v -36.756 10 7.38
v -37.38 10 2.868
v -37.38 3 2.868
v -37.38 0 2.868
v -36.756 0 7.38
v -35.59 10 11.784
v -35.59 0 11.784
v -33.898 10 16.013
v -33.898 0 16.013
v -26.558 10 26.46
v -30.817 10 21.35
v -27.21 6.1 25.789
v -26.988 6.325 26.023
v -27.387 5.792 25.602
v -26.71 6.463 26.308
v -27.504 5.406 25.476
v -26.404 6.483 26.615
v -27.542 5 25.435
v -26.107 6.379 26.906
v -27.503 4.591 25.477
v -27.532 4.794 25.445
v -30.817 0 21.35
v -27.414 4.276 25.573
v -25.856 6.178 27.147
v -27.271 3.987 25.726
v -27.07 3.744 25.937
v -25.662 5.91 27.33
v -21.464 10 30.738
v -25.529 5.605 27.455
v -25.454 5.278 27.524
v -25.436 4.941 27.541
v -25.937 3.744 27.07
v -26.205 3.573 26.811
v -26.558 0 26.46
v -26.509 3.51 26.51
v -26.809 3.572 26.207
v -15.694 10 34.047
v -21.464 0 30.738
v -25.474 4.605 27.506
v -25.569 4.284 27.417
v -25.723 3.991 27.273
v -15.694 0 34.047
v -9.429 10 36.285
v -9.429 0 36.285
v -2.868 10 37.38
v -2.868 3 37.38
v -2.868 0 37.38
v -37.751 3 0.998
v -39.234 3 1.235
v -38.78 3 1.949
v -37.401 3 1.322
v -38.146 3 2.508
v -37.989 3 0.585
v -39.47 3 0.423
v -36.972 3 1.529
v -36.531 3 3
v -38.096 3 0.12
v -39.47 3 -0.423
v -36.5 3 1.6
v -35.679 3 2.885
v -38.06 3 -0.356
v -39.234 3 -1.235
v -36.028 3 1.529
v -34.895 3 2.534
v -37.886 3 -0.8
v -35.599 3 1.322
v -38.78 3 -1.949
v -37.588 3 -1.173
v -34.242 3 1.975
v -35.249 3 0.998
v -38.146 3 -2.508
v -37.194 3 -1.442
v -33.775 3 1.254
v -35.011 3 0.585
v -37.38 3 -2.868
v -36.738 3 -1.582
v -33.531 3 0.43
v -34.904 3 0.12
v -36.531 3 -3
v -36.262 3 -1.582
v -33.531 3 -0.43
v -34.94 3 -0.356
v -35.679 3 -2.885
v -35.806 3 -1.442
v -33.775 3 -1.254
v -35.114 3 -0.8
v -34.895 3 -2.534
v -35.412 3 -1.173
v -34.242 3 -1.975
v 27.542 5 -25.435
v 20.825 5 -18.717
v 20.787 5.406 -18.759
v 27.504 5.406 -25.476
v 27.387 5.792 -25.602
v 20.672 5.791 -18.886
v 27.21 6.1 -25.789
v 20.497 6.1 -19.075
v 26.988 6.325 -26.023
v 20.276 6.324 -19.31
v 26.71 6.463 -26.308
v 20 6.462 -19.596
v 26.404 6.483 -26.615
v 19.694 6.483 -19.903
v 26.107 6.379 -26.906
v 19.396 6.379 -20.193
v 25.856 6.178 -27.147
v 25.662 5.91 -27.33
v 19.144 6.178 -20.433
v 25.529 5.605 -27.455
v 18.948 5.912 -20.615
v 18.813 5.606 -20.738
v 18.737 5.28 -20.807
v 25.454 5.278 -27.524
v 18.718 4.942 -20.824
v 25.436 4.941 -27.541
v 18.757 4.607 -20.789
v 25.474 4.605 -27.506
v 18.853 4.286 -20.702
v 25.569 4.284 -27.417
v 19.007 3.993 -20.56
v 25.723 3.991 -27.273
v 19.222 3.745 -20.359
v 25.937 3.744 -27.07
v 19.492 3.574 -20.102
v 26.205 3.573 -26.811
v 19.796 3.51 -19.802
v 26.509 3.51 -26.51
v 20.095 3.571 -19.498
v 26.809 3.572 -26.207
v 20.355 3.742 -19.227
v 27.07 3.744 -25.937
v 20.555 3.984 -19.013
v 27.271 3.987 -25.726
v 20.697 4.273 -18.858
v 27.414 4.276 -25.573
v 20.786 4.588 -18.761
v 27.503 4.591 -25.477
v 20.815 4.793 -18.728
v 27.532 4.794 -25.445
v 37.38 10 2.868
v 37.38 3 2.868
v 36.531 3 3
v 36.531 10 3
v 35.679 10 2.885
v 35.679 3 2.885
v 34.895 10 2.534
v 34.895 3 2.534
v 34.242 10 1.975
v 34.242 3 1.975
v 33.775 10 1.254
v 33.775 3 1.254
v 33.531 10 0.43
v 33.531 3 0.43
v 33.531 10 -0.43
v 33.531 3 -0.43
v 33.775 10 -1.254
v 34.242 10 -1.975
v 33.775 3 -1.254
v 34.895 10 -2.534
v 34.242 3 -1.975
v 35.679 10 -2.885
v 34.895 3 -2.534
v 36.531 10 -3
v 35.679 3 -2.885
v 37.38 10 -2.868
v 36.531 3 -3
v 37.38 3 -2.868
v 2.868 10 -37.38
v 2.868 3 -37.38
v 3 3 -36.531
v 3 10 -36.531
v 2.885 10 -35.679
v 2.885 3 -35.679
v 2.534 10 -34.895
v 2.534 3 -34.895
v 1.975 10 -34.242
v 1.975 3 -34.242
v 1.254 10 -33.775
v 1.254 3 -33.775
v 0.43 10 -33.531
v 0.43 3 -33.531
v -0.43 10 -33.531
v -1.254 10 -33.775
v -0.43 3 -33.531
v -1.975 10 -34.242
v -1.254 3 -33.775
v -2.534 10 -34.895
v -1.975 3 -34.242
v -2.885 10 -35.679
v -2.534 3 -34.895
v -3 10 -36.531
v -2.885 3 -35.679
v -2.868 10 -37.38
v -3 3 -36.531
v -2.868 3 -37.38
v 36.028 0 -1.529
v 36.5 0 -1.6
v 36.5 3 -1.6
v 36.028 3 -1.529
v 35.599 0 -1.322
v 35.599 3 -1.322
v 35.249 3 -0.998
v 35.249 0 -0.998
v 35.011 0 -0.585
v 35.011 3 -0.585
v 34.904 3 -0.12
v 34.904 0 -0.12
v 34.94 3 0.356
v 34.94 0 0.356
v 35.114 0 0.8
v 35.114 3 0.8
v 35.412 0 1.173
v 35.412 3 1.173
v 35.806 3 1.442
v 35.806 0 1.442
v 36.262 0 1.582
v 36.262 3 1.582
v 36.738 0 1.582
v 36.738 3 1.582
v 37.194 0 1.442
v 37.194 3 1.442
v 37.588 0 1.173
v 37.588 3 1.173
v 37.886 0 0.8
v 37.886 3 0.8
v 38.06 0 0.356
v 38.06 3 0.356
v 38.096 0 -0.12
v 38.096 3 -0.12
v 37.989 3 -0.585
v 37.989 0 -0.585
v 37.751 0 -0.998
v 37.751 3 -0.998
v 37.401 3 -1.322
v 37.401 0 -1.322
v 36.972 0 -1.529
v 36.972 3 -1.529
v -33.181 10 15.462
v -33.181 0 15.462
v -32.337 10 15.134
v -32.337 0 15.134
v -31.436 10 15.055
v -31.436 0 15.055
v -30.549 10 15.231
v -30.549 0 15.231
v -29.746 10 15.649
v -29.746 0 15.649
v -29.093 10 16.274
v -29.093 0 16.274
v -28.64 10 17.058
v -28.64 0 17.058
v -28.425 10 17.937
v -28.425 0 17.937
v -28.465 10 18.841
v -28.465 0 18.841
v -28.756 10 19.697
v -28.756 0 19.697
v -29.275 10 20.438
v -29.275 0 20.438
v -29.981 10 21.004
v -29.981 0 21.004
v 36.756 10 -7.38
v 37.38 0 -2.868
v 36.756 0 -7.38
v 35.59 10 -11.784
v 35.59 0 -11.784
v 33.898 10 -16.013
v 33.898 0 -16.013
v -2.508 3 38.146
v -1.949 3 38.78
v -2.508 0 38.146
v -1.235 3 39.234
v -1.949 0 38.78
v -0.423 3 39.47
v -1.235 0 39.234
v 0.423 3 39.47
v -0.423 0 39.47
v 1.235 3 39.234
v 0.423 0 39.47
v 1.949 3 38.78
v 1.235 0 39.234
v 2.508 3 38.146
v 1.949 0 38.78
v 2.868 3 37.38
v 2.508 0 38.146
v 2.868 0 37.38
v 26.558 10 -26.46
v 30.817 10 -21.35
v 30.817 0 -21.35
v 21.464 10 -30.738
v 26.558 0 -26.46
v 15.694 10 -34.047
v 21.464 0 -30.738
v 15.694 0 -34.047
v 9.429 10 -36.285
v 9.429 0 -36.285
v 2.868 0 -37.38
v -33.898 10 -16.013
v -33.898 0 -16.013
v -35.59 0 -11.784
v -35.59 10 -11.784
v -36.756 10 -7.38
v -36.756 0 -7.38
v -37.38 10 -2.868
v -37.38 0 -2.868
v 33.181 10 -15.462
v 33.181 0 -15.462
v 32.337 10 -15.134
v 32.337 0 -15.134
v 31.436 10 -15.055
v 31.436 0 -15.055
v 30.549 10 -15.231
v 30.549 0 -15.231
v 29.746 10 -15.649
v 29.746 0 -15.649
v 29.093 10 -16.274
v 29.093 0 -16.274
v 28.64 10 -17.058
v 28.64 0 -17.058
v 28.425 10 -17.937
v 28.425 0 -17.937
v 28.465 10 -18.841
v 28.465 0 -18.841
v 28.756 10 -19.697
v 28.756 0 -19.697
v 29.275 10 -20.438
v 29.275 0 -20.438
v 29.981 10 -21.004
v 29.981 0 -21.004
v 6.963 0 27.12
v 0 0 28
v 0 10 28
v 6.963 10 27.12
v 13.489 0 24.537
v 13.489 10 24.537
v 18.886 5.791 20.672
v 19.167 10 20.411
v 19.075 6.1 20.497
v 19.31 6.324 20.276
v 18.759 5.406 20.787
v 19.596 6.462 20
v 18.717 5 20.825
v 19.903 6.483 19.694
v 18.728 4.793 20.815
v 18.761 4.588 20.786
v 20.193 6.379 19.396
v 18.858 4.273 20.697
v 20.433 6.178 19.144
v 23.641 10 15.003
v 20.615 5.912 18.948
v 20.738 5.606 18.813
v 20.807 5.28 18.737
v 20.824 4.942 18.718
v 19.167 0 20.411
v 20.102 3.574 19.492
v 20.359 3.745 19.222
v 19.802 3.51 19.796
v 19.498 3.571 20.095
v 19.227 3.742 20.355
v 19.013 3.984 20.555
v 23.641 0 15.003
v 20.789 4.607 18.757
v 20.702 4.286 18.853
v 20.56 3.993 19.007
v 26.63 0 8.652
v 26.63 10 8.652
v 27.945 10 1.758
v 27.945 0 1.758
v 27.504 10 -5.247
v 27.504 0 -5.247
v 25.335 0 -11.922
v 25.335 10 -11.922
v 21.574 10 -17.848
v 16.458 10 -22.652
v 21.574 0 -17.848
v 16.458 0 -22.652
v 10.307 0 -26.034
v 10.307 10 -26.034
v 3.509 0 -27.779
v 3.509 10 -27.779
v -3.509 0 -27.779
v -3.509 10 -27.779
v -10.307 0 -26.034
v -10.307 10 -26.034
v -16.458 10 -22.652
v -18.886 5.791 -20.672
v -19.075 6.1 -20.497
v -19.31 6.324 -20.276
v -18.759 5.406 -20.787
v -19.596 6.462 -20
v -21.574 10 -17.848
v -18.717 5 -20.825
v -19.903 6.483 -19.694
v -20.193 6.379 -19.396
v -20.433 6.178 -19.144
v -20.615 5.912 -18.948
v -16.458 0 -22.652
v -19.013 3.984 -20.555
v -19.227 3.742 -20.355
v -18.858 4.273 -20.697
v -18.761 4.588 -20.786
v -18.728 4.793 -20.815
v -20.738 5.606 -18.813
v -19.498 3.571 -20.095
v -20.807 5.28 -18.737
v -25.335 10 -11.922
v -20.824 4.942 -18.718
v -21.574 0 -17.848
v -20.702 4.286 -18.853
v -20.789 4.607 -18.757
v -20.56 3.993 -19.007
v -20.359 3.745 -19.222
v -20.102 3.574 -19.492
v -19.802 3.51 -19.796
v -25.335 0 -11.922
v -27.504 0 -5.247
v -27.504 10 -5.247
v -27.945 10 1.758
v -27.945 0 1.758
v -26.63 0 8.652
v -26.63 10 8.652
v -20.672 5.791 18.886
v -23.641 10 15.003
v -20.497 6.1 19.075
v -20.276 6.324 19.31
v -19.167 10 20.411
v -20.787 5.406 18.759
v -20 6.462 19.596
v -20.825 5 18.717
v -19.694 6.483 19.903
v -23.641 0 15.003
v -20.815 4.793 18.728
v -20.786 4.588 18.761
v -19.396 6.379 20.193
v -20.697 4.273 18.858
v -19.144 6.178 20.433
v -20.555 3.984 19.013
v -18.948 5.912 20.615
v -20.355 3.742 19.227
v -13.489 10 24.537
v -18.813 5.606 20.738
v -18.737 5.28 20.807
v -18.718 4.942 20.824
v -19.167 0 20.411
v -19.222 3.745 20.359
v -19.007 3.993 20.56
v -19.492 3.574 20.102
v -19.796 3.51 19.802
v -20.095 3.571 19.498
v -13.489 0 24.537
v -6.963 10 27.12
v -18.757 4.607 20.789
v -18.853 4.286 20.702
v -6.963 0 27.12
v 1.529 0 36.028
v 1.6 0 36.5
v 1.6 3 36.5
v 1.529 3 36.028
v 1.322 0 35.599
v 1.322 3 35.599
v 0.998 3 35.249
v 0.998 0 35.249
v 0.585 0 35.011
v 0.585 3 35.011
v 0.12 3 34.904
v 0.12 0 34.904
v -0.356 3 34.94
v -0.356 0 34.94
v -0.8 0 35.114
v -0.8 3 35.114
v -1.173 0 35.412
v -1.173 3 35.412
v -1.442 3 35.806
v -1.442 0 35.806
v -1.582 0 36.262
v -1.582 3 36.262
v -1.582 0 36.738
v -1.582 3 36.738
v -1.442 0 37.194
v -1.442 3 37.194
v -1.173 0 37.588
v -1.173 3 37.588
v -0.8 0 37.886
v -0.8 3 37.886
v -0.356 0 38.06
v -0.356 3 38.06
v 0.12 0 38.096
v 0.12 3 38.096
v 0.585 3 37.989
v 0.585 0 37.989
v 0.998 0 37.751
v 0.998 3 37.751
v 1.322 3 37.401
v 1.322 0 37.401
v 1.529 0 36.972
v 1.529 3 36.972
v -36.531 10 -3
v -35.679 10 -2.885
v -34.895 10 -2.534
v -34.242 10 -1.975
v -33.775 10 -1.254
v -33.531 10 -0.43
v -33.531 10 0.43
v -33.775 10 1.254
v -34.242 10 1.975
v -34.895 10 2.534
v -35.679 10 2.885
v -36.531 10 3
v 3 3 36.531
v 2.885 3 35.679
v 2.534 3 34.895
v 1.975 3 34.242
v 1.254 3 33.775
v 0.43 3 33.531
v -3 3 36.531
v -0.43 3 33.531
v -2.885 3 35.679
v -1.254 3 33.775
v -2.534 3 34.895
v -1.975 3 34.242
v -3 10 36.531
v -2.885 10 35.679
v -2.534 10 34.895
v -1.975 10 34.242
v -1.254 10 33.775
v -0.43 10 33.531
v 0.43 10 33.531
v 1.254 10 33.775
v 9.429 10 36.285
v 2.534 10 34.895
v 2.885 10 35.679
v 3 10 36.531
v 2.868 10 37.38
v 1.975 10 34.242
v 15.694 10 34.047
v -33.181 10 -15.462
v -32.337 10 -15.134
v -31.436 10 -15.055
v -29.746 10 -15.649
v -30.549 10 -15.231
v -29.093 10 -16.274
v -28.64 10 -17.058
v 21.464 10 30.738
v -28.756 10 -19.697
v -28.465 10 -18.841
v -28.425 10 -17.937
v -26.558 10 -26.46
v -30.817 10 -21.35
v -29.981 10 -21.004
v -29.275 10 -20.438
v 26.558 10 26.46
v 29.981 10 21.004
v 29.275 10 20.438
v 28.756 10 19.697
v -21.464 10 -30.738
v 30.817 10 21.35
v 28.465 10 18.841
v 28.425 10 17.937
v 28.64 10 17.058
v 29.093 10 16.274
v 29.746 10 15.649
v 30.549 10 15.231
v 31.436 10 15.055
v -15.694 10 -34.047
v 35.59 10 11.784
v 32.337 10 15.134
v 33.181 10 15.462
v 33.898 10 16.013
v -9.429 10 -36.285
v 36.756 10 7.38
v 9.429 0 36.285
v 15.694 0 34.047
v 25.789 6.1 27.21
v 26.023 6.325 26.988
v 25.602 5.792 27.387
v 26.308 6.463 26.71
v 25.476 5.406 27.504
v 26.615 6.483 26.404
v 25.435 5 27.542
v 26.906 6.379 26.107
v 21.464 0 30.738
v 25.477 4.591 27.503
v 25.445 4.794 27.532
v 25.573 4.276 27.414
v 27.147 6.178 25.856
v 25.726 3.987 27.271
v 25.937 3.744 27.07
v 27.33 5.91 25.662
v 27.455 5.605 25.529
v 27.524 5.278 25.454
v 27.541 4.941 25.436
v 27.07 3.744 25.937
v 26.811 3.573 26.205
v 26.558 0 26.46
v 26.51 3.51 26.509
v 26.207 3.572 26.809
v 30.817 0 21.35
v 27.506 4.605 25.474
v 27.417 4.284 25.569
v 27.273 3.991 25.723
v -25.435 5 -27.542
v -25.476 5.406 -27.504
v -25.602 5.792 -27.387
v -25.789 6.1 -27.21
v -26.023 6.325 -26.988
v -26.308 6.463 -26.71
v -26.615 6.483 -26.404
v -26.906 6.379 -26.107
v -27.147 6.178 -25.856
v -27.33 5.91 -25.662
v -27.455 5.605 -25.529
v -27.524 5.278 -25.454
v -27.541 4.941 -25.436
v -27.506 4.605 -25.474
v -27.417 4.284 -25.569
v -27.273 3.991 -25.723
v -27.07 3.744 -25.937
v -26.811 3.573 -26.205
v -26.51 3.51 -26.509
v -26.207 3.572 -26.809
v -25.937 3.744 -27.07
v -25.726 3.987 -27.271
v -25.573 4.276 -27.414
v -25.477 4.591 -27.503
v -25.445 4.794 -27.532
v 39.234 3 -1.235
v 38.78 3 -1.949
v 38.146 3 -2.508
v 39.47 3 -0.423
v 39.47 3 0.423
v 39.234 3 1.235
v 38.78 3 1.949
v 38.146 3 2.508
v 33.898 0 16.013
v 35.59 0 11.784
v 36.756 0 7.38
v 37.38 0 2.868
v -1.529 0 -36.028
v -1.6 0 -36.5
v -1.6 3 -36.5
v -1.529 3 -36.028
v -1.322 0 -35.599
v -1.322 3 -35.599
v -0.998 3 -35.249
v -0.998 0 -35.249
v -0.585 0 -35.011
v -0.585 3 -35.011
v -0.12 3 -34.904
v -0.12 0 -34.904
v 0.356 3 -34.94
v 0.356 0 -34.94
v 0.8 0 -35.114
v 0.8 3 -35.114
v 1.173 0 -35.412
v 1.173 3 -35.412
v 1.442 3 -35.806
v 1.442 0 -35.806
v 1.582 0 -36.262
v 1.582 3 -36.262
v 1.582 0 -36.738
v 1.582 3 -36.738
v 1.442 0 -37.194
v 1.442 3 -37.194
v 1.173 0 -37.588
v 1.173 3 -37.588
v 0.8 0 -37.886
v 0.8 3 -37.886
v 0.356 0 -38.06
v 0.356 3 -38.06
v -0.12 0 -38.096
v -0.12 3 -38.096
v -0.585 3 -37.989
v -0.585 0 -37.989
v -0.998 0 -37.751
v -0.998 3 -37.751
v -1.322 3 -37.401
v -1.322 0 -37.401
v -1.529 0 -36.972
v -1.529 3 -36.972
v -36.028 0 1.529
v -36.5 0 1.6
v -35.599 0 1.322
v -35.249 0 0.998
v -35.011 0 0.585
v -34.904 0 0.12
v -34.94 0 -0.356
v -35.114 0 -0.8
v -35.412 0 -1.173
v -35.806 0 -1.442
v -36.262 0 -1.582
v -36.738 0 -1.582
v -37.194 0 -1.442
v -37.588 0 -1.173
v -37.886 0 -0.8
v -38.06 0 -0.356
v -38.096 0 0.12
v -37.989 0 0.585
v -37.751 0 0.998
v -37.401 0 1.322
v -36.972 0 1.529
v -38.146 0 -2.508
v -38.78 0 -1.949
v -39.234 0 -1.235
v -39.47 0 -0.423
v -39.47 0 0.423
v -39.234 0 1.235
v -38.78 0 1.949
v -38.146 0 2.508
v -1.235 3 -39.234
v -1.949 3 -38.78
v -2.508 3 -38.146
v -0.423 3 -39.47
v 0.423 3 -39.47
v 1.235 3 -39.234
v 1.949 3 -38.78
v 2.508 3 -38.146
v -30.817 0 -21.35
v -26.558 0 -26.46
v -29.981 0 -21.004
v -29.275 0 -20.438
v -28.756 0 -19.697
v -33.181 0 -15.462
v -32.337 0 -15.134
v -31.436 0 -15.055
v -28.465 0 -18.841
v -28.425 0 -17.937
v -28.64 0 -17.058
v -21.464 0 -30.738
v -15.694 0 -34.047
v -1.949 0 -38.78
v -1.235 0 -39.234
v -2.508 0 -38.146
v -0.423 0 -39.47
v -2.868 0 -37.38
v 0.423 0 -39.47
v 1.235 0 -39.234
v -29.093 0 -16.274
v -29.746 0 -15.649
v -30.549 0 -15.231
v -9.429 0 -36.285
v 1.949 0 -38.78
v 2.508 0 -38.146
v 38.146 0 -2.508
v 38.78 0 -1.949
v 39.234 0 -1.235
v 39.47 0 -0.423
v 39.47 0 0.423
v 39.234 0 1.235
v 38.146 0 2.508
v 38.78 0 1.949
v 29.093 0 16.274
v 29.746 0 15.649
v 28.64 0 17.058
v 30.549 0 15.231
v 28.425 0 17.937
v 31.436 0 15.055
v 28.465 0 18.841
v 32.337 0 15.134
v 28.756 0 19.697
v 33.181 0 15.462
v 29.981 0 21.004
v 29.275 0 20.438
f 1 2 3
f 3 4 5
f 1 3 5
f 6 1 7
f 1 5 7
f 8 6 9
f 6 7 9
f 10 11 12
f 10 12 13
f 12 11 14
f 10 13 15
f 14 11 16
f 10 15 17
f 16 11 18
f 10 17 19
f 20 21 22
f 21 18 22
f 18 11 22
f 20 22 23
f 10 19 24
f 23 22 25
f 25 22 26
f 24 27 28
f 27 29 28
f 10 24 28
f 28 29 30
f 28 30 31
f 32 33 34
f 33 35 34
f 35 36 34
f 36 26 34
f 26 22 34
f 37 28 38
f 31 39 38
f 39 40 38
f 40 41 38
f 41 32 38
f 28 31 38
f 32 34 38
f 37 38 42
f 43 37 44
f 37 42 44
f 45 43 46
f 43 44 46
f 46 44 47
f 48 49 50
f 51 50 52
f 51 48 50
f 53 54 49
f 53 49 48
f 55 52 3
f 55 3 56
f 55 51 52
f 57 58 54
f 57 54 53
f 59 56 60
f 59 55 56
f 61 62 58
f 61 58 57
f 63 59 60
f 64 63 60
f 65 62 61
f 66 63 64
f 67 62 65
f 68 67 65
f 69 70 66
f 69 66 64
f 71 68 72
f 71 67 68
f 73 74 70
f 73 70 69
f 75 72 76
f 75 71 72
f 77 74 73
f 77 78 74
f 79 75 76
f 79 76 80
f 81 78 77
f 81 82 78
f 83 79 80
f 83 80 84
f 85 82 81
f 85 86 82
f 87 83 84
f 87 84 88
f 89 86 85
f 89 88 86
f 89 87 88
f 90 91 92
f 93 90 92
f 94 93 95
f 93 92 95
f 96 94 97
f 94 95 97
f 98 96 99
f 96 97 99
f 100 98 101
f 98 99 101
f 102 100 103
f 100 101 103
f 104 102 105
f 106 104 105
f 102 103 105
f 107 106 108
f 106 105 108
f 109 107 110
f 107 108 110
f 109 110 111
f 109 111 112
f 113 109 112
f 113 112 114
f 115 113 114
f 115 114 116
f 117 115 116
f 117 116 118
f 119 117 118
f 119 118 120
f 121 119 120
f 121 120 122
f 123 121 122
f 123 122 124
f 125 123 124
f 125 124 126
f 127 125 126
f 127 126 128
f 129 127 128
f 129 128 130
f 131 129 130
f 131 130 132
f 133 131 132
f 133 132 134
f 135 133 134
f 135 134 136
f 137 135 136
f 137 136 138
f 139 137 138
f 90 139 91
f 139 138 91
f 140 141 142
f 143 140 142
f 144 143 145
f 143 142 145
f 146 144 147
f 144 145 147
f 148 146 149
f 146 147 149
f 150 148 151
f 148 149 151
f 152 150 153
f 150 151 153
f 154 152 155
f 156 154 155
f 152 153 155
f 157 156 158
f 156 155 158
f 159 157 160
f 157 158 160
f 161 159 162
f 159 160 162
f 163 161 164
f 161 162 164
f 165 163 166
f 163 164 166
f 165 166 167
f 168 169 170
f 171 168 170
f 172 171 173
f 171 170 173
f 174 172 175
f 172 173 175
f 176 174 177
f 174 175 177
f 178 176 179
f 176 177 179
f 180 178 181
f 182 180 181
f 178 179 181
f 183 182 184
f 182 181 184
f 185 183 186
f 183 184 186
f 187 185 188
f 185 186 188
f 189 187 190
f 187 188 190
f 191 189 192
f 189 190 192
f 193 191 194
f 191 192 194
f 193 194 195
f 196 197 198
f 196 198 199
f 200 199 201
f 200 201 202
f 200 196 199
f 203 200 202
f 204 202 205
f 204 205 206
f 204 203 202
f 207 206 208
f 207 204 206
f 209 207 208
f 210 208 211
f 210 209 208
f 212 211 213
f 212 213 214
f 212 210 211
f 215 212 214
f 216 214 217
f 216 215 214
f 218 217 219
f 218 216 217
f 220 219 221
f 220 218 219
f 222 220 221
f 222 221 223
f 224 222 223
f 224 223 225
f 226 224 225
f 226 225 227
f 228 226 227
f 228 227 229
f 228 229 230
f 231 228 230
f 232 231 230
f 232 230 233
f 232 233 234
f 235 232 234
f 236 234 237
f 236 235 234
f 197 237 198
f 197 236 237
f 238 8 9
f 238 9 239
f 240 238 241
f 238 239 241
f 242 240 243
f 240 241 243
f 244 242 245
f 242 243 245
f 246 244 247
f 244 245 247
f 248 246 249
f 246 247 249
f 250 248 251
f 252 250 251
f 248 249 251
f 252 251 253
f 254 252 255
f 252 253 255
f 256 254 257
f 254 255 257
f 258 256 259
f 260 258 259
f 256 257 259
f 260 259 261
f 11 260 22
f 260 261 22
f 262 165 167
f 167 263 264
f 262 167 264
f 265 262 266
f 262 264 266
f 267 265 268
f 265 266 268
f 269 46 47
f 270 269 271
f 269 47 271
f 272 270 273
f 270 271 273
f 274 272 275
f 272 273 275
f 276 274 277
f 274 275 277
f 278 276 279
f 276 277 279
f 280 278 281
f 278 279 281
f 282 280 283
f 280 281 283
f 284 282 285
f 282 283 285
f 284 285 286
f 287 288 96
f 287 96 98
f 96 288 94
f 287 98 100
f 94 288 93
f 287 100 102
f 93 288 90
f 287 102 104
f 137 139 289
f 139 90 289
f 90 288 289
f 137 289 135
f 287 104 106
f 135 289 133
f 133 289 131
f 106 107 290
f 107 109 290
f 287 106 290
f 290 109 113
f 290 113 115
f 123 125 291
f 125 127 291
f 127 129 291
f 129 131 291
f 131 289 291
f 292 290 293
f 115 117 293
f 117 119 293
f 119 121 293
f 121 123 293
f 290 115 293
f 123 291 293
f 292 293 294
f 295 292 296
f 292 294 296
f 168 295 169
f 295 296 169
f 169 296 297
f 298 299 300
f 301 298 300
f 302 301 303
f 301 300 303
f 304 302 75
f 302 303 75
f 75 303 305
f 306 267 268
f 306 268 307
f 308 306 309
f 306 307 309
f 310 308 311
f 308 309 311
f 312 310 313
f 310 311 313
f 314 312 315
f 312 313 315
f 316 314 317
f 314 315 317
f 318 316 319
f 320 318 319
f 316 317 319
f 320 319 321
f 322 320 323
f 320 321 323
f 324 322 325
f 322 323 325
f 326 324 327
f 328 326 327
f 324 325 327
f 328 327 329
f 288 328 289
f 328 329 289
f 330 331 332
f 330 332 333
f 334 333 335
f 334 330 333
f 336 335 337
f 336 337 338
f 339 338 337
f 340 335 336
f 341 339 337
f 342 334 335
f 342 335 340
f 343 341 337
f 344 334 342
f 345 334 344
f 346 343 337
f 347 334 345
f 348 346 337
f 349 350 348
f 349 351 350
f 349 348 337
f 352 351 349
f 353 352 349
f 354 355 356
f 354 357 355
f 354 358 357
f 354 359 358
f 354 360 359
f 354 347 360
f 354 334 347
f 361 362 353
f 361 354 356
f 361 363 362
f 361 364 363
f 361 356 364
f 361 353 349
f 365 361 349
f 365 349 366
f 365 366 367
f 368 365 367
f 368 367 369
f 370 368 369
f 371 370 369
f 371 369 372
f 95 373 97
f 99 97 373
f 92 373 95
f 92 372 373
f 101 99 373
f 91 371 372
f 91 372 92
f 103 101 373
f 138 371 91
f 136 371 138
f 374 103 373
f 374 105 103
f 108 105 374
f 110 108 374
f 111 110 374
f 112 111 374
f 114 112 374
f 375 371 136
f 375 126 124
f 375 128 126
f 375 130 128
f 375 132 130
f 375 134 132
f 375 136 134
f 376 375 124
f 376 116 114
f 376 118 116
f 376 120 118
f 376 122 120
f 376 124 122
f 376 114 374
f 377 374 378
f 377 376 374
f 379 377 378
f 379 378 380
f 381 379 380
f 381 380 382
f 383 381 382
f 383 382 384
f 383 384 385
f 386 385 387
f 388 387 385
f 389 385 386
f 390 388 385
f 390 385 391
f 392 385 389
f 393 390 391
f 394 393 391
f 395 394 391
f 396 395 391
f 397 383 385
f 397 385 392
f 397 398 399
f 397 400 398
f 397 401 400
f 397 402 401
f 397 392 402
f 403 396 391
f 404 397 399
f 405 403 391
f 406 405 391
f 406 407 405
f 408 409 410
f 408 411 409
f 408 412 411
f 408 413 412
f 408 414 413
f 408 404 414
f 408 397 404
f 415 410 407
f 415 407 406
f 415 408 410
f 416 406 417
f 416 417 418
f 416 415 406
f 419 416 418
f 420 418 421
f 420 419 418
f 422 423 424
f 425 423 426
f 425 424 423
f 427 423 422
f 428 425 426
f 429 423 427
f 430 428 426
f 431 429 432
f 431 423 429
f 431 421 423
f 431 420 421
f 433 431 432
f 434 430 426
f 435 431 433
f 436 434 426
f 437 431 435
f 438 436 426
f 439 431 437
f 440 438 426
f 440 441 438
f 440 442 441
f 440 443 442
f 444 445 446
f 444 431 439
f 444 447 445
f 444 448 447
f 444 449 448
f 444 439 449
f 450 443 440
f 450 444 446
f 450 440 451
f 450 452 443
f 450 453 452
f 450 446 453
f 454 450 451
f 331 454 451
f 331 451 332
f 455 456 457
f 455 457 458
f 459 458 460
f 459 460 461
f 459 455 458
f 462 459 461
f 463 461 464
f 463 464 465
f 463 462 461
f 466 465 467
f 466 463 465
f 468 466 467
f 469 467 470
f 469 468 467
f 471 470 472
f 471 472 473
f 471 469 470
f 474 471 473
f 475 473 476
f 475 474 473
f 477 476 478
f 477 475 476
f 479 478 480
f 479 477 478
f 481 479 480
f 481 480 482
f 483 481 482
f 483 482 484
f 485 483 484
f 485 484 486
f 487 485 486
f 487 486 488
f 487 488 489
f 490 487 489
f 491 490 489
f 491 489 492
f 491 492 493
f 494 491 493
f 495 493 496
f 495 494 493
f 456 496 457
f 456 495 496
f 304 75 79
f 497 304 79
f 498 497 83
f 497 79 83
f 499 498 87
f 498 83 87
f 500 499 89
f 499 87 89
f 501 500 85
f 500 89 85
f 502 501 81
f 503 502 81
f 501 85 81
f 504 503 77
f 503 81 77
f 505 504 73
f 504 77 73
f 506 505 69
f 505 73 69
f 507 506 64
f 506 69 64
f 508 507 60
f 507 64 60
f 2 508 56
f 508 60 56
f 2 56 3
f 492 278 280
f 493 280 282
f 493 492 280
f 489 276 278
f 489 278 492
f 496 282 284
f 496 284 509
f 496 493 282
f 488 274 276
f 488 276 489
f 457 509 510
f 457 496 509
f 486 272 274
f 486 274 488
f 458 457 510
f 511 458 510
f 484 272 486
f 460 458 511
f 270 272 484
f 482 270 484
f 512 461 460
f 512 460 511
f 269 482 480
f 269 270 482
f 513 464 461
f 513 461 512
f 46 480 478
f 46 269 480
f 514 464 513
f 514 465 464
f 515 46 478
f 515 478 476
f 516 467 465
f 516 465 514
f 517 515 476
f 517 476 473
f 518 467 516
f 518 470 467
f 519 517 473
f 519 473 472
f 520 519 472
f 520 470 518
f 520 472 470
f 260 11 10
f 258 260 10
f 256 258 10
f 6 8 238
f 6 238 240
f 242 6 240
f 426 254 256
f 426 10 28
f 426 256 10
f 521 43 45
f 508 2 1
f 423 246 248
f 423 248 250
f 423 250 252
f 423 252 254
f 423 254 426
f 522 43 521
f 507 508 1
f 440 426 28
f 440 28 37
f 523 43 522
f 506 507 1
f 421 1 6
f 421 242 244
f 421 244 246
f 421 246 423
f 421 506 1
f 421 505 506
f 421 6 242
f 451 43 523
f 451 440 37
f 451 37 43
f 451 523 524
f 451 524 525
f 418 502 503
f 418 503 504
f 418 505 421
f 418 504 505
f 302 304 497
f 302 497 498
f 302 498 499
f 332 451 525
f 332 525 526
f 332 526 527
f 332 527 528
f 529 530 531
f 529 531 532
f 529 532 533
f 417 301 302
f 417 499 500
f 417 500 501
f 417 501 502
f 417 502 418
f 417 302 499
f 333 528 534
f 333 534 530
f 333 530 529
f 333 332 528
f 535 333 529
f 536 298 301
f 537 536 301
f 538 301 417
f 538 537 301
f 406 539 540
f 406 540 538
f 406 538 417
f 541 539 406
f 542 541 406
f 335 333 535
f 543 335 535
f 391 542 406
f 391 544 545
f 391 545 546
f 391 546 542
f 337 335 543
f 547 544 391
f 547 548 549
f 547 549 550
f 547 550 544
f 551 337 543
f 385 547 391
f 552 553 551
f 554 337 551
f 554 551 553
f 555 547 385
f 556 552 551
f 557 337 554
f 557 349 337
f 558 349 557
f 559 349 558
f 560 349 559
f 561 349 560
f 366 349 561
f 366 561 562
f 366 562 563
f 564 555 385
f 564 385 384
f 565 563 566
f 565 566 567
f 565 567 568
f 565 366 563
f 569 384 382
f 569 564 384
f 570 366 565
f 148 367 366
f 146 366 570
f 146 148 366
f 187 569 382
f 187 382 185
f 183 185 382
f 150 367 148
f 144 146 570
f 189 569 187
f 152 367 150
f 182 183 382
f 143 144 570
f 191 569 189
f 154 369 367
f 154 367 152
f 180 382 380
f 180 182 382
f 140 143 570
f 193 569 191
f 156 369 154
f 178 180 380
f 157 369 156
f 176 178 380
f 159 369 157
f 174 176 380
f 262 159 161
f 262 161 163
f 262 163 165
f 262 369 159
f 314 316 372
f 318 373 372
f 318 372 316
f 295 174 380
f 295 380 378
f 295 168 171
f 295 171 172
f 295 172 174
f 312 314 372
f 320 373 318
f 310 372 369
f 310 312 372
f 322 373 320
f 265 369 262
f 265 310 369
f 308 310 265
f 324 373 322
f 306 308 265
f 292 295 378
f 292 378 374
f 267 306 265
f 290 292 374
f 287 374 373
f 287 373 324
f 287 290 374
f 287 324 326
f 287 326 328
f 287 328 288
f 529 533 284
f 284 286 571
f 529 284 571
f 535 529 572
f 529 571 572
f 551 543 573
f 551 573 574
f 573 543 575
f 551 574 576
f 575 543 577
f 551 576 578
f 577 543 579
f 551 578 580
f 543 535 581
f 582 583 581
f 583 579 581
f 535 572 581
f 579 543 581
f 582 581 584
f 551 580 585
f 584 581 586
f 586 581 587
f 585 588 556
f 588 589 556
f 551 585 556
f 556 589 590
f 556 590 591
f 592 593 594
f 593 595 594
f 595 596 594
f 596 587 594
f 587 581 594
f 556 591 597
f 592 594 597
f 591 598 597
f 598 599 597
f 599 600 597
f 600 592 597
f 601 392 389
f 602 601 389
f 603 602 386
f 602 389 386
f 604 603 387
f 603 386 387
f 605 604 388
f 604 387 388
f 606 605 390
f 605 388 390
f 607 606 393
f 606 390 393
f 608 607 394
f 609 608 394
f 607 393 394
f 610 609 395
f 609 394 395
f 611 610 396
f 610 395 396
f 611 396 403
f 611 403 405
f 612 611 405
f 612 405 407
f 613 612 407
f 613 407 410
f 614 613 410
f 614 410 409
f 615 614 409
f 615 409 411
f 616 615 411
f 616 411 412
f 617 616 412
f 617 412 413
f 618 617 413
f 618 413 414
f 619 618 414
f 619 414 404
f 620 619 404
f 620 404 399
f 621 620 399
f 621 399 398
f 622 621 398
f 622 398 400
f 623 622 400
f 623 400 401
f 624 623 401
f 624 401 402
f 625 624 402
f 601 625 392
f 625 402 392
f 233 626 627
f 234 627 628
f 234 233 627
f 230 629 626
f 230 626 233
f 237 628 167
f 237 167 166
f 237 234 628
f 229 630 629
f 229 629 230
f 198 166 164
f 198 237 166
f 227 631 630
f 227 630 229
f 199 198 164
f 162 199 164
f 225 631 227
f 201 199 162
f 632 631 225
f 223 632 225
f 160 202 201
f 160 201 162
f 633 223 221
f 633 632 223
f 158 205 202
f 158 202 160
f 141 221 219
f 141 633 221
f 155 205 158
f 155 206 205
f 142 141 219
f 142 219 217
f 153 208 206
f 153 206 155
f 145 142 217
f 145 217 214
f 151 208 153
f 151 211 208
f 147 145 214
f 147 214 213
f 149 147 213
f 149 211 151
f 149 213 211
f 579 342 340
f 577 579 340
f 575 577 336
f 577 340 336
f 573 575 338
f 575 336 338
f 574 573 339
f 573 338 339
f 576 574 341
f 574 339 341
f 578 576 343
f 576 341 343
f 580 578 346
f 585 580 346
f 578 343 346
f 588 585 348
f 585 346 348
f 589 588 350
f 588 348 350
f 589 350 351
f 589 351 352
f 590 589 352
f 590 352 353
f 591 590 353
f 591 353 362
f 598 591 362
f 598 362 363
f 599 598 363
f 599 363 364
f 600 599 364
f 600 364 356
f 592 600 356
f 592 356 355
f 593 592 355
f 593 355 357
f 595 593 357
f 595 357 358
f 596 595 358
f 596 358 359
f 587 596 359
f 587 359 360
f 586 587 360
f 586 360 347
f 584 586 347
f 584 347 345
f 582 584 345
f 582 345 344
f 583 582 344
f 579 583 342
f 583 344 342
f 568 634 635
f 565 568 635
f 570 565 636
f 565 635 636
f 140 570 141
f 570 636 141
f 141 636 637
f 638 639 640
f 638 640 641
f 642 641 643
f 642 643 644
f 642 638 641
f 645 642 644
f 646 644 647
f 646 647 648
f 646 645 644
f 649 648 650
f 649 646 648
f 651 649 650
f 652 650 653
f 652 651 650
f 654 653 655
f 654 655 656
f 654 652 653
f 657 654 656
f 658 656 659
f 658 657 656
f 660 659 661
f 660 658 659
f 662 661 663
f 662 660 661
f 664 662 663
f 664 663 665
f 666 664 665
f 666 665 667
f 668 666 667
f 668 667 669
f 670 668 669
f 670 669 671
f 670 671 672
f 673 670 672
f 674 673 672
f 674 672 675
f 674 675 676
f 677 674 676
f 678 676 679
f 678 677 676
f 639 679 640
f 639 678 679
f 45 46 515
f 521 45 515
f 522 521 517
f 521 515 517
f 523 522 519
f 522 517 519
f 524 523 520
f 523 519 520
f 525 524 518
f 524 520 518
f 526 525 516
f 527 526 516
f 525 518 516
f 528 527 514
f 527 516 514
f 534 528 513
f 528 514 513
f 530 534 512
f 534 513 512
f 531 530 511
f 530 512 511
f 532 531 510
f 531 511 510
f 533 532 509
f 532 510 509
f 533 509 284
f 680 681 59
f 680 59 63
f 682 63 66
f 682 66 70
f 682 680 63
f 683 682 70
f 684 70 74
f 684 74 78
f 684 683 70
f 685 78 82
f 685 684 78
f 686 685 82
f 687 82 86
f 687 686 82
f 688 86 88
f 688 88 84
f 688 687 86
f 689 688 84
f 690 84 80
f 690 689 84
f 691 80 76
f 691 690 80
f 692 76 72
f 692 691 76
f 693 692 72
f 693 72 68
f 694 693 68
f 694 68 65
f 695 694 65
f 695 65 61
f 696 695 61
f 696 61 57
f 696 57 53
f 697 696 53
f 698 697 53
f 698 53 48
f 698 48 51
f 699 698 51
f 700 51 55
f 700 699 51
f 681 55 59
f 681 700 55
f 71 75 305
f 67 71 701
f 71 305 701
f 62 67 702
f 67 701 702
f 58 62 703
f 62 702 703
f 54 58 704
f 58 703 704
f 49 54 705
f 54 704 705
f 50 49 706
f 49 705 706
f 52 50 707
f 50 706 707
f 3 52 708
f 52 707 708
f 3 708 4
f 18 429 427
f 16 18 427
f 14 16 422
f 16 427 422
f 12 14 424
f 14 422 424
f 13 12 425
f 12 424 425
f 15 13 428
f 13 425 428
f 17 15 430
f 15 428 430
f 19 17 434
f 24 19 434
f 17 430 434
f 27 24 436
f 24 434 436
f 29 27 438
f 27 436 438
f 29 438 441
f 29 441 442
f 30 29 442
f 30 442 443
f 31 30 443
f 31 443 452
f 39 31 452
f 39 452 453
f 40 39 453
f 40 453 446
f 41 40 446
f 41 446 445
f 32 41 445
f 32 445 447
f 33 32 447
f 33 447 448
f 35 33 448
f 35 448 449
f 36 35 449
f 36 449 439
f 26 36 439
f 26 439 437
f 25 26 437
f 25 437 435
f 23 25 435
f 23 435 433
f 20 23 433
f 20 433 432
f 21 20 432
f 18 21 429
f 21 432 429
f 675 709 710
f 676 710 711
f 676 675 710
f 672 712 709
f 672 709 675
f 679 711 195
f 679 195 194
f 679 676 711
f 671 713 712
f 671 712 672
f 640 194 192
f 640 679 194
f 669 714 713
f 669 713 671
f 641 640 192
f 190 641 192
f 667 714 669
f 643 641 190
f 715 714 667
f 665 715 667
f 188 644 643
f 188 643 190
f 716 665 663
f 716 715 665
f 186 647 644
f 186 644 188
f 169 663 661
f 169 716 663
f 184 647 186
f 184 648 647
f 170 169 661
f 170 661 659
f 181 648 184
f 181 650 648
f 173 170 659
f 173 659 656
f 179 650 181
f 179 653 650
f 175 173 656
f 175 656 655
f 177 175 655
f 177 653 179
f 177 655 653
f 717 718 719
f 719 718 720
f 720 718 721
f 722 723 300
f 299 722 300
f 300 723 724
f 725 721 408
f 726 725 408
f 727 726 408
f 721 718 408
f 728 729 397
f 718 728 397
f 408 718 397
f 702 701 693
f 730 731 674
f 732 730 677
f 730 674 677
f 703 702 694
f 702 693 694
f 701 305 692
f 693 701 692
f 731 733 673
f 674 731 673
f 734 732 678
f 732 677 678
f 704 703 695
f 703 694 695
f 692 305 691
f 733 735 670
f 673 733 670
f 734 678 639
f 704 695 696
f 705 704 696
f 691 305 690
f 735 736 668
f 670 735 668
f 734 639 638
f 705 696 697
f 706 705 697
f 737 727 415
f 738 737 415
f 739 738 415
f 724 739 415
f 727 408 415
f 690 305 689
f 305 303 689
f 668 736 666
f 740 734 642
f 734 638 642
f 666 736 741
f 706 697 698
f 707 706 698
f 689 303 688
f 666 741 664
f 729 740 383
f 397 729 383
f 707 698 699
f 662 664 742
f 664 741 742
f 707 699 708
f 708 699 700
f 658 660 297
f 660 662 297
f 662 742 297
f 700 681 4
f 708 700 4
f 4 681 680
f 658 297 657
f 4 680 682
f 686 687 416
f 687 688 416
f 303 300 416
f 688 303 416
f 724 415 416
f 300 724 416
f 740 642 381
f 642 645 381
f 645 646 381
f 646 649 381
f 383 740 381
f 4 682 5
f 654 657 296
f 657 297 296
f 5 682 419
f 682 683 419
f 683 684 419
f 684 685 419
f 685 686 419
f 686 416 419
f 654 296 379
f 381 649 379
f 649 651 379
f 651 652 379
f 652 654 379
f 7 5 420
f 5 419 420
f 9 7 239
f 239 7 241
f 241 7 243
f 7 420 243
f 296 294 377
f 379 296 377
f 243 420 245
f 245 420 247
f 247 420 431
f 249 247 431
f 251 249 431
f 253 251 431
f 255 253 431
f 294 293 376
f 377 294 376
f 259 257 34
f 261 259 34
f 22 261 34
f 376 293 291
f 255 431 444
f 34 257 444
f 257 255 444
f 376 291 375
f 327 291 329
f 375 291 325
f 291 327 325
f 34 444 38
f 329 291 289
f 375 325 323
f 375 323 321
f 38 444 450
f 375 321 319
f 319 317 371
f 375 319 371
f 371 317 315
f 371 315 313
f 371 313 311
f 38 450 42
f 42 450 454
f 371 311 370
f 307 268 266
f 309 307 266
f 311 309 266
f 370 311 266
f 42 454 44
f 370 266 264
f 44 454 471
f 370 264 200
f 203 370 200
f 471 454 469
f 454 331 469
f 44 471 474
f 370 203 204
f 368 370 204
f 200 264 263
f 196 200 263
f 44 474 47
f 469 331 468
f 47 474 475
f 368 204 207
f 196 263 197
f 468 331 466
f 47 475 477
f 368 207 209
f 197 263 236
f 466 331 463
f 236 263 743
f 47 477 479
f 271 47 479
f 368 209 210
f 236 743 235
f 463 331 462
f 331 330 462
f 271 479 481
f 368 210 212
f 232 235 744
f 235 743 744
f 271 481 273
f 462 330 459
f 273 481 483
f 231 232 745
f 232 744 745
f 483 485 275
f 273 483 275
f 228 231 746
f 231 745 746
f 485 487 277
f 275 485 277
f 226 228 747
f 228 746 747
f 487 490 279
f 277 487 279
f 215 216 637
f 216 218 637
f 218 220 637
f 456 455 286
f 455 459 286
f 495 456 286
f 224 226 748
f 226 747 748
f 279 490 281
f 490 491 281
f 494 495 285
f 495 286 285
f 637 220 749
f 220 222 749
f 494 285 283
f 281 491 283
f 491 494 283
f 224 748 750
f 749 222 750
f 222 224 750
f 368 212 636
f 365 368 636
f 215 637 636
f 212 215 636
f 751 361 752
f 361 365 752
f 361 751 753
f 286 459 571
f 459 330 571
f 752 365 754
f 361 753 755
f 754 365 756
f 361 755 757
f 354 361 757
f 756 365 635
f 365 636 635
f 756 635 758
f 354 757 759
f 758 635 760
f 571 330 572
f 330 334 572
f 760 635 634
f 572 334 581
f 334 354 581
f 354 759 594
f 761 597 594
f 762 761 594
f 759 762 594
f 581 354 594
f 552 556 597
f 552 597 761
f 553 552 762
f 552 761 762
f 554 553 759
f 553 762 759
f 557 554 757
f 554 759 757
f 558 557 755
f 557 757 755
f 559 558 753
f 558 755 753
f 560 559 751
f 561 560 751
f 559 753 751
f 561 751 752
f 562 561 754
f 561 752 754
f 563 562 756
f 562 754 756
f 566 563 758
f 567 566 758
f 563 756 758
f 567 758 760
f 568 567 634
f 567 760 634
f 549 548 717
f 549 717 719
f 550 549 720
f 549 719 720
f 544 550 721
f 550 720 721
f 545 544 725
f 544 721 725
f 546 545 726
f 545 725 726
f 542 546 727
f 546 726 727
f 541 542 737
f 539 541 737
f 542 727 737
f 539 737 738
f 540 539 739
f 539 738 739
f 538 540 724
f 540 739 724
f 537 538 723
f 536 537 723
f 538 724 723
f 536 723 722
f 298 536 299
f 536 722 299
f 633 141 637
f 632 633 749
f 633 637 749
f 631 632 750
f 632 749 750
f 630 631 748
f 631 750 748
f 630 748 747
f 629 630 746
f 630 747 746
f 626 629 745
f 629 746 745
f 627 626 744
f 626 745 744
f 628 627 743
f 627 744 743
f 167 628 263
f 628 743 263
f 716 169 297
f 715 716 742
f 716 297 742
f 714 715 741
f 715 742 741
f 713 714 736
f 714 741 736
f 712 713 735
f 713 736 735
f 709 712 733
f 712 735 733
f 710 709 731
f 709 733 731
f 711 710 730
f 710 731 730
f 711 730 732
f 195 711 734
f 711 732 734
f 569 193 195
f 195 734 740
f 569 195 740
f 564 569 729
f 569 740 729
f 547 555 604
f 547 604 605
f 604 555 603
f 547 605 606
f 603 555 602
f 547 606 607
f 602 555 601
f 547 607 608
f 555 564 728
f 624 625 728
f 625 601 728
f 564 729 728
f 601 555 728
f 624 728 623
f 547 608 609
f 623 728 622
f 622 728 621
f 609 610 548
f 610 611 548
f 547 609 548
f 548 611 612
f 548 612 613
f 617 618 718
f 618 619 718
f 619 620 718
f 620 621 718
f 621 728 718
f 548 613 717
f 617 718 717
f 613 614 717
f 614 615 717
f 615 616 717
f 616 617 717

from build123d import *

# Parameters (mm, degrees)
IZIM2_R                     = 28
Y_KSEKLIK_EKSTR_ZYON5_DEPTH = 10
IZIM3_R                     = 1.49
KES_EKSTR_ZYON1_DEPTH       = 54.801017528
DAIRESEL_KAPLAMA1_COUNT     = 4
IZIM4_R                     = 3
IZIM4_R_2                   = 1.6
Y_KSEKLIK_EKSTR_ZYON6_DEPTH = 3
DAIRESEL_KAPLAMA2_COUNT     = 4


with BuildPart() as part:
    # Çizim2 → Yükseklik-Ekstrüzyon5 (new body)
    with BuildSketch(Plane(origin=(0, 0, 0), x_dir=(1, 0, 0), z_dir=(0, 1, 0))):
        with BuildLine():
            ThreePointArc((-37.380138356, -2.867988228), (-36.240115286, -9.599694998), (-33.898134186, -16.013013418))
            ThreePointArc((-33.898134186, -16.013013418), (-28.838645946, -16.65), (-30.816743504, -21.350138636))
            ThreePointArc((-30.816743504, -21.350138636), (-18.652225356, -32.52067941), (-2.867988228, -37.380138356))
            ThreePointArc((-2.867988228, -37.380138356), (0, -33.5), (2.867988228, -37.380138356))
            ThreePointArc((2.867988228, -37.380138356), (18.652225356, -32.52067941), (30.816743504, -21.350138636))
            ThreePointArc((30.816743504, -21.350138636), (28.838645946, -16.65), (33.898134186, -16.013013418))
            ThreePointArc((33.898134186, -16.013013418), (36.240115286, -9.599694998), (37.380138356, -2.867988228))
            ThreePointArc((37.380138356, -2.867988228), (33.5, 0), (37.380138356, 2.867988228))
            ThreePointArc((37.380138356, 2.867988228), (36.240115286, 9.599694998), (33.898134186, 16.013013418))
            ThreePointArc((33.898134186, 16.013013418), (28.838645946, 16.65), (30.816743504, 21.350138636))
            ThreePointArc((30.816743504, 21.350138636), (18.652225356, 32.52067941), (2.867988228, 37.380138356))
            ThreePointArc((2.867988228, 37.380138356), (0, 33.5), (-2.867988228, 37.380138356))
            ThreePointArc((-2.867988228, 37.380138356), (-18.652225356, 32.52067941), (-30.816743504, 21.350138636))
            ThreePointArc((-30.816743504, 21.350138636), (-28.838645946, 16.65), (-33.898134186, 16.013013418))
            ThreePointArc((-33.898134186, 16.013013418), (-36.240115286, 9.599694998), (-37.380138356, 2.867988228))
            ThreePointArc((-37.380138356, 2.867988228), (-33.5, 0), (-37.380138356, -2.867988228))
        make_face()
        Circle(IZIM2_R, mode=Mode.SUBTRACT)
    extrude(amount=Y_KSEKLIK_EKSTR_ZYON5_DEPTH)

    # Çizim3 → Kes-Ekstrüzyon1 (cut, through all)
    with BuildSketch(Plane(origin=(0, 0, 0), x_dir=(0.7071067811865464, 0, 0.7071067811865488), z_dir=(-0.7071067811865488, 0, 0.7071067811865464))):
        with Locations((0, 5)):
            Circle(IZIM3_R)
    kes_ekstr_zyon1 = extrude(amount=-KES_EKSTR_ZYON1_DEPTH, mode=Mode.SUBTRACT)

    # Dairesel Kaplama1: Kes-Ekstrüzyon1 ×4 about axis
    dairesel_kaplama1_axis = Axis((0, 31.917325532, 0), (0, -1, 0))
    for i in range(1, DAIRESEL_KAPLAMA1_COUNT):
        add(kes_ekstr_zyon1.rotate(dairesel_kaplama1_axis, i * 360 / DAIRESEL_KAPLAMA1_COUNT), mode=Mode.SUBTRACT)

    # Çizim4 → Yükseklik-Ekstrüzyon6 (add)
    with BuildSketch(Plane(origin=(0, 0, 0), x_dir=(1, 0, 0), z_dir=(0, 1, 0))):
        with Locations((-36.5, 0)):
            Circle(IZIM4_R)
        with Locations((-36.5, 0)):
            Circle(IZIM4_R_2, mode=Mode.SUBTRACT)
    y_kseklik_ekstr_zyon6 = extrude(amount=Y_KSEKLIK_EKSTR_ZYON6_DEPTH)

    # Dairesel Kaplama2: Yükseklik-Ekstrüzyon6 ×4 about axis
    dairesel_kaplama2_axis = Axis((0, 31.917325532, 0), (0, -1, 0))
    for i in range(1, DAIRESEL_KAPLAMA2_COUNT):
        add(y_kseklik_ekstr_zyon6.rotate(dairesel_kaplama2_axis, i * 360 / DAIRESEL_KAPLAMA2_COUNT))


solid = part.part
